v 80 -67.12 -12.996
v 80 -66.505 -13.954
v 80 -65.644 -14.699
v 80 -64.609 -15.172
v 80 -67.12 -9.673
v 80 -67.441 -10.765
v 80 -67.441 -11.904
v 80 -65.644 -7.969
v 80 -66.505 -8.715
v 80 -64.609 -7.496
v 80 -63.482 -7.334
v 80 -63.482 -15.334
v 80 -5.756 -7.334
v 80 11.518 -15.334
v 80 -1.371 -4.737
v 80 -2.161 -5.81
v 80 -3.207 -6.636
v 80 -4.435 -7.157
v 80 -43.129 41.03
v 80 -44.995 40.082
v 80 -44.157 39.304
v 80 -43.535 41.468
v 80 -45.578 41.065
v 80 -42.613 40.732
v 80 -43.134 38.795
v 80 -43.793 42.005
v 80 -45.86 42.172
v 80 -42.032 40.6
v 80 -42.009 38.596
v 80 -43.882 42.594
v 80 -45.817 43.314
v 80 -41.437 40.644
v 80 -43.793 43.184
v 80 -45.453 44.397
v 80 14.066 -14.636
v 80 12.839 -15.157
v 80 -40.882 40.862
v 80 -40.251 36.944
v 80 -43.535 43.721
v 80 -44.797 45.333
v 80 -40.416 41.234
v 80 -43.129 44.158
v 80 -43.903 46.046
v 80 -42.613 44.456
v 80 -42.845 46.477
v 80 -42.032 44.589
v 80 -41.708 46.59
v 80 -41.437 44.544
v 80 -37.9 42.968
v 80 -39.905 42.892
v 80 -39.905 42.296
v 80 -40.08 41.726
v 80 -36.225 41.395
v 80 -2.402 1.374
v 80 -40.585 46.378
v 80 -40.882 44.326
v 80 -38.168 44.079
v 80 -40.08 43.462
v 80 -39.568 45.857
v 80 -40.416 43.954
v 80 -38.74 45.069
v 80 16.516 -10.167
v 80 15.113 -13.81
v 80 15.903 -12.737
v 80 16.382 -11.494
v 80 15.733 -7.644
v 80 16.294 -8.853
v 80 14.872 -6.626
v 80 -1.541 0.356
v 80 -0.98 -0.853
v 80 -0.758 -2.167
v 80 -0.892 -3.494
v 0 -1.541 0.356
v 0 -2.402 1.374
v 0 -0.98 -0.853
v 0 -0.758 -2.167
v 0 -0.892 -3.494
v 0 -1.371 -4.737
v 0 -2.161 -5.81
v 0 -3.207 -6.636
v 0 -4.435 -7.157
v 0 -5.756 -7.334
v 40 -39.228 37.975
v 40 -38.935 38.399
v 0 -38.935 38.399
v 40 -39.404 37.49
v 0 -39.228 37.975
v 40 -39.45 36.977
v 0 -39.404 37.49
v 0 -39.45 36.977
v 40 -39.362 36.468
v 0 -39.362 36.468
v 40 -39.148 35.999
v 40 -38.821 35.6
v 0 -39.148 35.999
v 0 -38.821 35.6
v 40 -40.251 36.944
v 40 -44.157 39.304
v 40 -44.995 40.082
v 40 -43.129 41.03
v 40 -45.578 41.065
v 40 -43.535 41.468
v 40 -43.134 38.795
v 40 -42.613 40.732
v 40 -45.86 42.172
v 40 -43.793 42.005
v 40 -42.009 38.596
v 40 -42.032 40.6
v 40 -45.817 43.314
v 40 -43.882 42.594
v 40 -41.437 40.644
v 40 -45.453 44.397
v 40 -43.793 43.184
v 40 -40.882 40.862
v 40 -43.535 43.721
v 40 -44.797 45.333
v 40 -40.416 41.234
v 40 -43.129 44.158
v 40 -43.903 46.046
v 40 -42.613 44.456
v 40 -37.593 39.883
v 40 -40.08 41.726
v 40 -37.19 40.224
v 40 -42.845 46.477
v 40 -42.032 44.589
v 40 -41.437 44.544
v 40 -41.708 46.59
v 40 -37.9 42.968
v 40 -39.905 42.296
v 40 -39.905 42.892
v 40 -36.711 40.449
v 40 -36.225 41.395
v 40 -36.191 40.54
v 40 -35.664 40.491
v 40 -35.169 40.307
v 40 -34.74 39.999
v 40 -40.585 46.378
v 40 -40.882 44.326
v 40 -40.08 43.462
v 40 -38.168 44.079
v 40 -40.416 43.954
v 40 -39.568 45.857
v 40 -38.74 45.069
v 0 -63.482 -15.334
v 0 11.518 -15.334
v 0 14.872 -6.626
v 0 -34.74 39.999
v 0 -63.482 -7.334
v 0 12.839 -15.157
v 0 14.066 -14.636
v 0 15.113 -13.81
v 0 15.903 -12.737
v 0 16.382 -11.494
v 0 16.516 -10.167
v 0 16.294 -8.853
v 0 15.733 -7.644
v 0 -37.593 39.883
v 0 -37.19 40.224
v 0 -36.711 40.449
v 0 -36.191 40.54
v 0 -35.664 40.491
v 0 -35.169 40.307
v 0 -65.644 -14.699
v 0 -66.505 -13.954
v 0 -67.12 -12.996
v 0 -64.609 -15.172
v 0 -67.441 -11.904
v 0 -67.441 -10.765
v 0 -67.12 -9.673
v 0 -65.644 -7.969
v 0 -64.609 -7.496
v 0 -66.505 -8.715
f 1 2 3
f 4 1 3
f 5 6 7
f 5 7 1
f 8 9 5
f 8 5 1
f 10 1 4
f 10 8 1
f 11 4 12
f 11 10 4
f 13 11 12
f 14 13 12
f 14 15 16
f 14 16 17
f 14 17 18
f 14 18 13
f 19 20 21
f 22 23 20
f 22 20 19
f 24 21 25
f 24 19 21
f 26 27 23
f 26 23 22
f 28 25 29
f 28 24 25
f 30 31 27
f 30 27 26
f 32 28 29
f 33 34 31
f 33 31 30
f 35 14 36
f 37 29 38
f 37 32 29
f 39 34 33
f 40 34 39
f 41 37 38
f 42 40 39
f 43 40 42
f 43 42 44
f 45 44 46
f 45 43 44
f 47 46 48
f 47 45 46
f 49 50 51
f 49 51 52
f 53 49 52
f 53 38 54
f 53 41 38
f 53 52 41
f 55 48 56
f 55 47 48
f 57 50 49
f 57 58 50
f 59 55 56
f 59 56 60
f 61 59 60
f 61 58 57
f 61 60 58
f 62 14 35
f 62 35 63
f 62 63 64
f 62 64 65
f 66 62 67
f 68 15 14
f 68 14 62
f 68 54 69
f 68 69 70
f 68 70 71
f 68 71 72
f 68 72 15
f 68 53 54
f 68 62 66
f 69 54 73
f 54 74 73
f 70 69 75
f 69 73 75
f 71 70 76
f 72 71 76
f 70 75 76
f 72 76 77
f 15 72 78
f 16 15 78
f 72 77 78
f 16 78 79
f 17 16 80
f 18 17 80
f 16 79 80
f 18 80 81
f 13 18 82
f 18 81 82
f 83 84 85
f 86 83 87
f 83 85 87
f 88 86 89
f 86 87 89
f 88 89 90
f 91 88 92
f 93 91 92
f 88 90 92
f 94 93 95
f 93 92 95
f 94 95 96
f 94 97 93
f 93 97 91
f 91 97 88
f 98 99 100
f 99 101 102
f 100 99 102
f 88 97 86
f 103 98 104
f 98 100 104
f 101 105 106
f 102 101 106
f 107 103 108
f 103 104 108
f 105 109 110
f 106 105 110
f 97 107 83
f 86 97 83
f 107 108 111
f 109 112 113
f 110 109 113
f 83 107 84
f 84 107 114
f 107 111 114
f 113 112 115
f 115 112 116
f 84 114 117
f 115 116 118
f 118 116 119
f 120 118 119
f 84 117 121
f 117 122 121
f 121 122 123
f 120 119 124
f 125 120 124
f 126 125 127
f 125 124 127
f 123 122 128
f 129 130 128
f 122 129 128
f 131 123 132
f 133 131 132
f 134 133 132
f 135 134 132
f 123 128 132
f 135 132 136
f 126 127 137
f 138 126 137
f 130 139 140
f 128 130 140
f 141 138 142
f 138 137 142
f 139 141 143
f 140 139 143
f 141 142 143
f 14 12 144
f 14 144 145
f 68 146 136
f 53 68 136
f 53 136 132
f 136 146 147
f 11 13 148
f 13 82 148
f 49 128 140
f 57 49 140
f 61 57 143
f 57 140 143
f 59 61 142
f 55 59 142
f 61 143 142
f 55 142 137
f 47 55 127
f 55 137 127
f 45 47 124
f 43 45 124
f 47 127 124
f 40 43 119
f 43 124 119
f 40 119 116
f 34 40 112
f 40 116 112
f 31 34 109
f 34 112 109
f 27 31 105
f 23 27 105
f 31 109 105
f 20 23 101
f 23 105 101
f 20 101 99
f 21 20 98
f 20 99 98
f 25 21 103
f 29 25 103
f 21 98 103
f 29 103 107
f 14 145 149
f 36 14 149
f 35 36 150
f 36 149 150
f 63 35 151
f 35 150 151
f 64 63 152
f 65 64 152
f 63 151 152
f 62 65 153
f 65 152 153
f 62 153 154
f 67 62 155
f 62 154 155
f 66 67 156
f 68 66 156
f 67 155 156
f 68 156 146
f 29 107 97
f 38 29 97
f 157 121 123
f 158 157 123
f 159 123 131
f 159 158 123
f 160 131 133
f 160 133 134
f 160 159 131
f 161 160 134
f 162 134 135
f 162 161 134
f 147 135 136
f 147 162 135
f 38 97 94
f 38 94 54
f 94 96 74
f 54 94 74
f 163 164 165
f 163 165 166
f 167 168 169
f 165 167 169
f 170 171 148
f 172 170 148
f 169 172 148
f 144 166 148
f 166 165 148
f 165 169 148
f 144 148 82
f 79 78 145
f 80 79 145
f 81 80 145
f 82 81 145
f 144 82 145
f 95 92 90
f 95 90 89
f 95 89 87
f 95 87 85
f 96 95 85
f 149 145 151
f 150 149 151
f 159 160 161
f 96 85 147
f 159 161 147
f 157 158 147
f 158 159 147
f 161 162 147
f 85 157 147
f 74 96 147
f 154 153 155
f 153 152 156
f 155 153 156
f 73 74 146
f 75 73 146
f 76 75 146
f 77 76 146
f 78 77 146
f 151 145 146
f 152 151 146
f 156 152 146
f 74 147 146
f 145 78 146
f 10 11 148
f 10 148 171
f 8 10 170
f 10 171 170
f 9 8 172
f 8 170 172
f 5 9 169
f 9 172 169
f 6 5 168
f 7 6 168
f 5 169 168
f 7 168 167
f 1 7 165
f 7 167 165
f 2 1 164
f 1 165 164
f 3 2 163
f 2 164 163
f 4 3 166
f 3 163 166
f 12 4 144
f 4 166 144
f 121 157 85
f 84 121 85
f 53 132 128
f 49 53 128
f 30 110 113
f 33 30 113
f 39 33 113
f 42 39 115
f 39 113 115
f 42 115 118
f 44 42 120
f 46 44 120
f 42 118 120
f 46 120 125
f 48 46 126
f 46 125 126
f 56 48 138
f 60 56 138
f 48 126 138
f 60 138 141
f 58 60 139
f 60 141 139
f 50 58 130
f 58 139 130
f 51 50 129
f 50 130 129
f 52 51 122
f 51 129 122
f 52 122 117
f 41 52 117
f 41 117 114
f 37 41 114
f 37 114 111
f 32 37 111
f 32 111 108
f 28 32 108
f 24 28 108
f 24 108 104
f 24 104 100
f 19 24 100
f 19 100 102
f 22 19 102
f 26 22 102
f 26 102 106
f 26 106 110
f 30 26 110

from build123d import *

# Parameters (mm, degrees)
F1_DEPTH    = 40
F4_DEPTH    = 40
F7_D        = 4
F8_T1_DEPTH = 45.0963937419
F8_T3_DEPTH = 44.9054294597


# Not quite as in the source:
# - a fillet or chamfer that OpenCascade refuses, or shapes differently, is made with other operations: its cross-section is extruded or revolved along the edge and cut away or added


with BuildPart() as f1:
    # F0 (on Right) → F1 (new body)
    with BuildSketch(Plane.YZ):
        with BuildLine():
            ThreePointArc((-63.4816033854, -7.334386461), (-67.4816033854, -11.334386461), (-63.4816033854, -15.334386461))
            Line((-63.4816033854, -15.334386461), (11.5183966146, -15.334386461))
            ThreePointArc((11.5183966146, -15.334386461), (16.1842937846, -12.1314406057), (14.8723445539, -6.6261479006))
            Line((14.8723445539, -6.6261479006), (-36.2252883959, 41.3947367846))
            Line((-36.2252883959, 41.3947367846), (-40.2507597139, 36.9440392082))
            Line((-40.2507597139, 36.9440392082), (-2.4015535455, 1.3738520994))
            ThreePointArc((-2.4015535455, 1.3738520994), (-1.0896043148, -4.1314406057), (-5.7555014847, -7.334386461))
            Line((-5.7555014847, -7.334386461), (-63.4816033854, -7.334386461))
        make_face()
    extrude(amount=F1_DEPTH)

    # F3 (on offset) → F4 (join)
    with BuildSketch(Plane.YZ.offset(40)):
        with BuildLine():
            Line((14.8723445539, -6.6261479006), (-36.2252883959, 41.3947367846))
            Line((-36.2252883959, 41.3947367846), (-40.2507597139, 36.9440392082))
            Line((-40.2507597139, 36.9440392082), (-2.4015535455, 1.3738520994))
            ThreePointArc((-2.4015535455, 1.3738520994), (-1.0896043148, -4.1314406057), (-5.7555014847, -7.334386461))
            Line((-5.7555014847, -7.334386461), (-63.4816033854, -7.334386461))
            ThreePointArc((-63.4816033854, -7.334386461), (-67.4816033854, -11.334386461), (-63.4816033854, -15.334386461))
            Line((-63.4816033854, -15.334386461), (11.5183966146, -15.334386461))
            ThreePointArc((11.5183966146, -15.334386461), (16.1842937846, -12.1314406057), (14.8723445539, -6.6261479006))
        make_face()
        with BuildLine():
            Line((-40.2507597139, 36.9440392082), (-36.2252883959, 41.3947367846))
            Line((-36.2252883959, 41.3947367846), (-37.8997588755, 42.9683821605))
            ThreePointArc((-37.8997588755, 42.9683821605), (-37.8866027682, 42.7814716227), (-37.8822141892, 42.5941500472))
            ThreePointArc((-37.8822141892, 42.5941500472), (-39.0988744687, 39.7213430575), (-42.0087241892, 38.5961511452))
            Line((-42.0087241892, 38.5961511452), (-40.2507597139, 36.9440392082))
        make_face()
        with BuildLine():
            ThreePointArc((-37.8822141892, 42.5941500472), (-37.8866027682, 42.7814716227), (-37.8997588755, 42.9683821605))
            ThreePointArc((-37.8997588755, 42.9683821605), (-44.7970348661, 45.3334602563), (-42.0087241892, 38.5961511452))
            ThreePointArc((-42.0087241892, 38.5961511452), (-39.0988744687, 39.7213430575), (-37.8822141892, 42.5941500472))
        make_face()
    extrude(amount=F4_DEPTH)

    # F7 (through all)
    with Locations(Plane.YZ.offset(120)):
        with Locations((-41.8822141892, 42.5941500472)):
            Hole(F7_D / 2)

    # F8: fillet of radius 2 on 2 edges, made by hand

    # F8_s2 → F8_t1 (cut)
    with BuildSketch(Plane.YZ.offset(-5.0963937419)):
        with BuildLine():
            ThreePointArc((-37.592731539, 39.8828452812), (-36.190570233, 40.5396197416), (-34.7397810103, 39.9986764439))
            Line((-34.7397810103, 39.9986764439), (-36.2252883959, 41.3947367846))
            Line((-36.2252883959, 41.3947367846), (-37.592731539, 39.8828452812))
        make_face()
    extrude(amount=F8_T1_DEPTH, mode=Mode.SUBTRACT)

    # F8_s4 → F8_t3 (cut)
    with BuildSketch(Plane.YZ.offset(-4.9054294597)):
        with BuildLine():
            ThreePointArc((-38.9345553117, 38.3992794224), (-39.4496135236, 36.9765661286), (-38.8209149921, 35.6002899083))
            Line((-38.8209149921, 35.6002899083), (-40.2507597139, 36.9440392082))
            Line((-40.2507597139, 36.9440392082), (-38.9345553117, 38.3992794224))
        make_face()
    extrude(amount=F8_T3_DEPTH, mode=Mode.SUBTRACT)


solid = f1.part
